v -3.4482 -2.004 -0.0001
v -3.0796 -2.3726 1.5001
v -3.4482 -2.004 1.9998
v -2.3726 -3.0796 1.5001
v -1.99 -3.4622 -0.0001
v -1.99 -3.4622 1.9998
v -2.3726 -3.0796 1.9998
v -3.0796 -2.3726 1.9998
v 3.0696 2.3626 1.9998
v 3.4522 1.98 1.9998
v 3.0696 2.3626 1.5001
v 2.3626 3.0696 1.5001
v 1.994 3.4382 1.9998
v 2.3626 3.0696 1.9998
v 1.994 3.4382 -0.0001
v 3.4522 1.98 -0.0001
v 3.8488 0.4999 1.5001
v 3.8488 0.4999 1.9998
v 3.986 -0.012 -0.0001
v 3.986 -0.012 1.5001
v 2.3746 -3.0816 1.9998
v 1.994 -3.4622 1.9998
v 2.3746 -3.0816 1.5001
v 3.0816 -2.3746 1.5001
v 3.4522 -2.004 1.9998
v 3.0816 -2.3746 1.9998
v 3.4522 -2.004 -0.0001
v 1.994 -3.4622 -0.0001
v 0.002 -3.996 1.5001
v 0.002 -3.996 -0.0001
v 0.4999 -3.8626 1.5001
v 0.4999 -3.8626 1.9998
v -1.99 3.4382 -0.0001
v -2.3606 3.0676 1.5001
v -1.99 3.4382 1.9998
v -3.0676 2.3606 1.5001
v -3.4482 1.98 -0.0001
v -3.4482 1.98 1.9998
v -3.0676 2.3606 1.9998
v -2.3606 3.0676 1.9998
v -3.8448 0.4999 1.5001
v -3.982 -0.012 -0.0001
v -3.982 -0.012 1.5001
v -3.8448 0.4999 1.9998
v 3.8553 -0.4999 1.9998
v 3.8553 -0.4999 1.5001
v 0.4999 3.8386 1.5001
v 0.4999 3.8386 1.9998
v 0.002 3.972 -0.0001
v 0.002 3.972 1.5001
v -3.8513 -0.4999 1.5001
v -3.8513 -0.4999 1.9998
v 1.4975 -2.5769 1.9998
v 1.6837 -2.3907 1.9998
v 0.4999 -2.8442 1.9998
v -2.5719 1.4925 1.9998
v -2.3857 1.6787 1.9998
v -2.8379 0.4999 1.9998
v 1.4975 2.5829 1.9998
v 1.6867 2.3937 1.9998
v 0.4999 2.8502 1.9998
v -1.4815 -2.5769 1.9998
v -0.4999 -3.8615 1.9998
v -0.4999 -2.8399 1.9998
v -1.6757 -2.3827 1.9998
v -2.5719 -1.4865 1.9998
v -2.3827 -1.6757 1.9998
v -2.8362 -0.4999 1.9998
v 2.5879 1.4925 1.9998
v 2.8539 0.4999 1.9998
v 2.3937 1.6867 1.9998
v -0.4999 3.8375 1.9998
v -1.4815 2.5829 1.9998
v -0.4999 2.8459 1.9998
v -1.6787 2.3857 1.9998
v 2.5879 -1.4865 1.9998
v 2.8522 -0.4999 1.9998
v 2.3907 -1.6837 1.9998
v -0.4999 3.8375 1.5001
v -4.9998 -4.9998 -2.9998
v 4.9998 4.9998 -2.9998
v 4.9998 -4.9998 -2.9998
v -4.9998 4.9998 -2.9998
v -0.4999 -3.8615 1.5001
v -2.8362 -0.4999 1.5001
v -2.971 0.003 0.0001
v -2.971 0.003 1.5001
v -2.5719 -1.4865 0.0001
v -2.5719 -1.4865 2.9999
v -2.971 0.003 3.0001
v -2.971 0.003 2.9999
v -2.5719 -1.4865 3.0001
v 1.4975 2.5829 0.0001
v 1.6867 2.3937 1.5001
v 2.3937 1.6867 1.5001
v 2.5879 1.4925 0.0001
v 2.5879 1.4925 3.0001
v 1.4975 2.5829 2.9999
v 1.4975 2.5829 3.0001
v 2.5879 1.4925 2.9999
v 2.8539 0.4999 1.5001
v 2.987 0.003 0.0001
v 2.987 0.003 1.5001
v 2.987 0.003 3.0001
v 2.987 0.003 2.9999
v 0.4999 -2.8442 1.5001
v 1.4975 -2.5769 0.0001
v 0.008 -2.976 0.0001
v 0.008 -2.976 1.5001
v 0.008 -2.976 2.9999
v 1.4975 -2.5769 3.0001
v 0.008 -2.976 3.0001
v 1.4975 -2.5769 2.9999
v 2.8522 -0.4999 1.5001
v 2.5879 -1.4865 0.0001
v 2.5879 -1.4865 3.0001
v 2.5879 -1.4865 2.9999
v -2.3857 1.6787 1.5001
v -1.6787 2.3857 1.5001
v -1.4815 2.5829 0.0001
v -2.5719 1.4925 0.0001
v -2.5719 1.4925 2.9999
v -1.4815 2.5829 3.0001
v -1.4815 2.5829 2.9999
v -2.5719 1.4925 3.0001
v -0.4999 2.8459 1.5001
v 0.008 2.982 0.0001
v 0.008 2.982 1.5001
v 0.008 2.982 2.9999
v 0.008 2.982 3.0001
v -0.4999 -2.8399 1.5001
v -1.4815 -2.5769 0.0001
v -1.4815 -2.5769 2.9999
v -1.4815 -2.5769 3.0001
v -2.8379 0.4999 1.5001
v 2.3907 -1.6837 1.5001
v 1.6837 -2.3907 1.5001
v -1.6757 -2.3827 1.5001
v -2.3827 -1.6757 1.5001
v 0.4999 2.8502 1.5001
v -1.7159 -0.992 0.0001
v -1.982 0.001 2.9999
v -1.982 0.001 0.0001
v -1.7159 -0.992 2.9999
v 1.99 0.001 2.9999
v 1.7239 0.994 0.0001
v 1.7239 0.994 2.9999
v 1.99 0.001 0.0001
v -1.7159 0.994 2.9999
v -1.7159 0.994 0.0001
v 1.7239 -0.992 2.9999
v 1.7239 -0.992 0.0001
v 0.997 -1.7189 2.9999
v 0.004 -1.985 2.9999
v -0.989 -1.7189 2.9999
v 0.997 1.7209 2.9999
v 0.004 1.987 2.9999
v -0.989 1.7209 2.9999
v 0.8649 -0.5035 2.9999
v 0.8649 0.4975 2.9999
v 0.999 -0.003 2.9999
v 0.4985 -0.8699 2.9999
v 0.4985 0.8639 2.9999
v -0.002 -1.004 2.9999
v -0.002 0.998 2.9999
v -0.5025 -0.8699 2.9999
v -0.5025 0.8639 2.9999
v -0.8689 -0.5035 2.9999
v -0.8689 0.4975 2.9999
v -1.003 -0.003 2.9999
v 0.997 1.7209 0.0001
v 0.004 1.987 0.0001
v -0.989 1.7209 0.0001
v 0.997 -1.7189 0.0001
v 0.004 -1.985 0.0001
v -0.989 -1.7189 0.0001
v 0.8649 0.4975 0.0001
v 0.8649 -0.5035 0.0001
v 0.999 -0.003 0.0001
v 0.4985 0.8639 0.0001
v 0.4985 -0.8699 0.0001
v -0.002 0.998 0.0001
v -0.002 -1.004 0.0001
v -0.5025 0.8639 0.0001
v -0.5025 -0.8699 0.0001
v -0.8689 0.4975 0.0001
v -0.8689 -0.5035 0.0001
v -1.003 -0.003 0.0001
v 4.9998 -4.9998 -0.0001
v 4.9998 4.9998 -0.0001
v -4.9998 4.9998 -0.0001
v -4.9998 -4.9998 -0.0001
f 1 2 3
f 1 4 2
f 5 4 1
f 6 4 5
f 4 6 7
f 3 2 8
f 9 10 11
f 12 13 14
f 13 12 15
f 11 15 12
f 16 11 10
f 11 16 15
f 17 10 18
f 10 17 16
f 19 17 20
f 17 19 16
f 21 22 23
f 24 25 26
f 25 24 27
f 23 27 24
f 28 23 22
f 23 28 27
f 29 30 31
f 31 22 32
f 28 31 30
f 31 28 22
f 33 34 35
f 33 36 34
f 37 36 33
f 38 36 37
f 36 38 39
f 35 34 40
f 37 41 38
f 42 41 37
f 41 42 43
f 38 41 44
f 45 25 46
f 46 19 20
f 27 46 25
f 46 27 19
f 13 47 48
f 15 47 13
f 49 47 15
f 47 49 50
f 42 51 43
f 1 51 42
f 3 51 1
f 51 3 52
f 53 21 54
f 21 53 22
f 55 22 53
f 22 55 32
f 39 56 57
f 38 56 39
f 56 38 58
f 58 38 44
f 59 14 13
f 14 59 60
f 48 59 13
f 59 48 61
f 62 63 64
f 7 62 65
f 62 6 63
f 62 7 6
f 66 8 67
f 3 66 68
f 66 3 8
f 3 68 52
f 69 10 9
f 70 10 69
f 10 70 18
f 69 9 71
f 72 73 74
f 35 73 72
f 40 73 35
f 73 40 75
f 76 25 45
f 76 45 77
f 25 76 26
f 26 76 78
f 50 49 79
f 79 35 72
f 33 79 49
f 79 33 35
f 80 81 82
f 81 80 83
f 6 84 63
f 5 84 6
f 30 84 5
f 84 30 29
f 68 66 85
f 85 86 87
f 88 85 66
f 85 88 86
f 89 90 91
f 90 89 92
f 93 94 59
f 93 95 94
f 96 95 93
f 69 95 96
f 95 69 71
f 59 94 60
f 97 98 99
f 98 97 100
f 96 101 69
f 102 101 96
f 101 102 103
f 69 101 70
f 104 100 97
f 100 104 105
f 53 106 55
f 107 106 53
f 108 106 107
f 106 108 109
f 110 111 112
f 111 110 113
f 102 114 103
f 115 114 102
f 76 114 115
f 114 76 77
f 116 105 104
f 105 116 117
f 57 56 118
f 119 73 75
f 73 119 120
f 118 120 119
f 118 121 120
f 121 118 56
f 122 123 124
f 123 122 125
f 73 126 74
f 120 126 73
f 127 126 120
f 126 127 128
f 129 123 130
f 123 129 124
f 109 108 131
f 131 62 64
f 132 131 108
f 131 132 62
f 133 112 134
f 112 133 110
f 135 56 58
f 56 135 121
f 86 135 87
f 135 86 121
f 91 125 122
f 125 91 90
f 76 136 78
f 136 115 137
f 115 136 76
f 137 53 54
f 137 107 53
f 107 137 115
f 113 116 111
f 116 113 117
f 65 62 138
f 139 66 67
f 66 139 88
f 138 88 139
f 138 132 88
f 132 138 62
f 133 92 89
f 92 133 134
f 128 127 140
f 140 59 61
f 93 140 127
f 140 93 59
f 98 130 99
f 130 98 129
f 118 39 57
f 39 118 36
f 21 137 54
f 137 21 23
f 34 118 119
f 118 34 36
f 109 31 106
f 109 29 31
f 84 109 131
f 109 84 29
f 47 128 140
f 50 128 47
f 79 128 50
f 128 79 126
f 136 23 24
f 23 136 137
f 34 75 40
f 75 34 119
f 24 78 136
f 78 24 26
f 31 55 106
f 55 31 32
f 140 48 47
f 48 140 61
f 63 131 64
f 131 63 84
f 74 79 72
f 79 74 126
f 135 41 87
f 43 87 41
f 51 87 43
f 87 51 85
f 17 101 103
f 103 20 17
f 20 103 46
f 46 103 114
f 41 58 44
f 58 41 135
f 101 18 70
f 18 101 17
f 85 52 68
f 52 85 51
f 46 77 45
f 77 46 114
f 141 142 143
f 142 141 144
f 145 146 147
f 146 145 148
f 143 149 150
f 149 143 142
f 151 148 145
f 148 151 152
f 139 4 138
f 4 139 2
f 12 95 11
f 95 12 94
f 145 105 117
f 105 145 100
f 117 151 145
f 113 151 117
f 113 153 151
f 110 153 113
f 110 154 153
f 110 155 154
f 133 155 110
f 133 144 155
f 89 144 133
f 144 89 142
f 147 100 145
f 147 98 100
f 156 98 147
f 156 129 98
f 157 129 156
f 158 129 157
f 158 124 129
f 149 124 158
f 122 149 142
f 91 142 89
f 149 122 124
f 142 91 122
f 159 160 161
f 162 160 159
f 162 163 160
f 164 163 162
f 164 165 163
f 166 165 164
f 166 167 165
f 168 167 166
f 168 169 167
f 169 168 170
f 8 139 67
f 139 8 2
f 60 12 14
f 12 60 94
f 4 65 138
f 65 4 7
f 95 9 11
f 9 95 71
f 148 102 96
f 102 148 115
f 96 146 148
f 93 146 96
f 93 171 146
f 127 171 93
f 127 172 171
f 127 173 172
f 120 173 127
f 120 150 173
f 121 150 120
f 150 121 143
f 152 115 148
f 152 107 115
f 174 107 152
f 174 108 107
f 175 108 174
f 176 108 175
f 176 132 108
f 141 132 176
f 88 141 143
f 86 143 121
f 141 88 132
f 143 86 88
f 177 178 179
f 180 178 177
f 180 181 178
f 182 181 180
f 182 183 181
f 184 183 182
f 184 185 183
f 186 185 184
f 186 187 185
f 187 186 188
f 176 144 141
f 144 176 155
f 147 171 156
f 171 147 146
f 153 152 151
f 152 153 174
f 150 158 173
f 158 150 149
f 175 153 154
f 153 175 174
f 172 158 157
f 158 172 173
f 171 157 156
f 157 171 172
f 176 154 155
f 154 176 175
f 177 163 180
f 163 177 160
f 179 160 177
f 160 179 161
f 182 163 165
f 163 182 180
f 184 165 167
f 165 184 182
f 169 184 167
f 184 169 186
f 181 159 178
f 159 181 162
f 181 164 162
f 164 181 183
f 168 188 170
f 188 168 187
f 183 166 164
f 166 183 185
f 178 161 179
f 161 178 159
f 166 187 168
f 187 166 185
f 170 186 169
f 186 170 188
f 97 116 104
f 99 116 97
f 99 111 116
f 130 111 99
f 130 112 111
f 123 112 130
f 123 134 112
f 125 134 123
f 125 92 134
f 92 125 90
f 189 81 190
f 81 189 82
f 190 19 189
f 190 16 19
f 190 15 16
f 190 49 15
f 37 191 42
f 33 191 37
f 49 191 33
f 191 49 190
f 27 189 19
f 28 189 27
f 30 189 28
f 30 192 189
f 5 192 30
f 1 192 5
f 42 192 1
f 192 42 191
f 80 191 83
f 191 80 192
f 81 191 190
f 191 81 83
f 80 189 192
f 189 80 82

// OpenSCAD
intersection() {
  cube(size = [11.9997, 11.9997, 7.1997], center = true);

  union() {
    translate([0, 0, -1.5])
    cube(size = [9.9997, 9.9997, 2.9997], center = true);
  
    difference() {
      difference() {
        union() {
          translate([0.002, -0.012, -0.5])
          cylinder(h = 4.9997, r1 = 3.984, r2 = 3.984, center = true, $fn = 12);
        
          translate([0.008, 0.003, 9.8])
          cylinder(h = 16.5997, r1 = 2.979, r2 = 2.979, center = true, $fn = 12);
        }
      
        difference() {
          union() {
            translate([-1.77636e-15, 1.77636e-15, 9.8])
            rotate([180, 0, 45])
            cube(size = [0.9998, 36.1998, 16.5998], center = true);
          
            translate([0, 0, 1.75])
            cube(size = [0.9998, 9.9998, 0.4998], center = true);
          }
        
          translate([0.008, 0.003, 9.8])
          cylinder(h = 16.5999, r1 = 2.979, r2 = 2.979, center = true, $fn = 12);
        }
      }
    
      union() {
        difference() {
          translate([6.55, 0, 1.75])
          cube(size = [23.0998, 0.9998, 0.4998], center = true);
        
          translate([0.004, 0.001, 1.75])
          cylinder(h = 0.4999, r1 = 1.986, r2 = 1.986, center = true, $fn = 12);
        }
      
        difference() {
          union() {
            translate([0, 0, 2.25])
            rotate([180, 0, 45])
            cube(size = [36.1998, 0.9998, 1.4998], center = true);
          
            translate([0.008, 0.003, 1.5])
            cylinder(h = 2.9998, r1 = 2.979, r2 = 2.979, center = true, $fn = 12);
          }
        
          difference() {
            translate([0.004, 0.001, -7.55])
            cylinder(h = 21.0999, r1 = 1.986, r2 = 1.986, center = true, $fn = 12);
          
            translate([-0.002, -0.003, 9.05])
            cylinder(h = 18.1, r1 = 1.001, r2 = 1.001, center = true, $fn = 12);
          }
        }
      
        translate([0.008, 0.003, 10.55])
        cylinder(h = 15.0998, r1 = 2.979, r2 = 2.979, center = true, $fn = 12);
      }
    }
  }
}
